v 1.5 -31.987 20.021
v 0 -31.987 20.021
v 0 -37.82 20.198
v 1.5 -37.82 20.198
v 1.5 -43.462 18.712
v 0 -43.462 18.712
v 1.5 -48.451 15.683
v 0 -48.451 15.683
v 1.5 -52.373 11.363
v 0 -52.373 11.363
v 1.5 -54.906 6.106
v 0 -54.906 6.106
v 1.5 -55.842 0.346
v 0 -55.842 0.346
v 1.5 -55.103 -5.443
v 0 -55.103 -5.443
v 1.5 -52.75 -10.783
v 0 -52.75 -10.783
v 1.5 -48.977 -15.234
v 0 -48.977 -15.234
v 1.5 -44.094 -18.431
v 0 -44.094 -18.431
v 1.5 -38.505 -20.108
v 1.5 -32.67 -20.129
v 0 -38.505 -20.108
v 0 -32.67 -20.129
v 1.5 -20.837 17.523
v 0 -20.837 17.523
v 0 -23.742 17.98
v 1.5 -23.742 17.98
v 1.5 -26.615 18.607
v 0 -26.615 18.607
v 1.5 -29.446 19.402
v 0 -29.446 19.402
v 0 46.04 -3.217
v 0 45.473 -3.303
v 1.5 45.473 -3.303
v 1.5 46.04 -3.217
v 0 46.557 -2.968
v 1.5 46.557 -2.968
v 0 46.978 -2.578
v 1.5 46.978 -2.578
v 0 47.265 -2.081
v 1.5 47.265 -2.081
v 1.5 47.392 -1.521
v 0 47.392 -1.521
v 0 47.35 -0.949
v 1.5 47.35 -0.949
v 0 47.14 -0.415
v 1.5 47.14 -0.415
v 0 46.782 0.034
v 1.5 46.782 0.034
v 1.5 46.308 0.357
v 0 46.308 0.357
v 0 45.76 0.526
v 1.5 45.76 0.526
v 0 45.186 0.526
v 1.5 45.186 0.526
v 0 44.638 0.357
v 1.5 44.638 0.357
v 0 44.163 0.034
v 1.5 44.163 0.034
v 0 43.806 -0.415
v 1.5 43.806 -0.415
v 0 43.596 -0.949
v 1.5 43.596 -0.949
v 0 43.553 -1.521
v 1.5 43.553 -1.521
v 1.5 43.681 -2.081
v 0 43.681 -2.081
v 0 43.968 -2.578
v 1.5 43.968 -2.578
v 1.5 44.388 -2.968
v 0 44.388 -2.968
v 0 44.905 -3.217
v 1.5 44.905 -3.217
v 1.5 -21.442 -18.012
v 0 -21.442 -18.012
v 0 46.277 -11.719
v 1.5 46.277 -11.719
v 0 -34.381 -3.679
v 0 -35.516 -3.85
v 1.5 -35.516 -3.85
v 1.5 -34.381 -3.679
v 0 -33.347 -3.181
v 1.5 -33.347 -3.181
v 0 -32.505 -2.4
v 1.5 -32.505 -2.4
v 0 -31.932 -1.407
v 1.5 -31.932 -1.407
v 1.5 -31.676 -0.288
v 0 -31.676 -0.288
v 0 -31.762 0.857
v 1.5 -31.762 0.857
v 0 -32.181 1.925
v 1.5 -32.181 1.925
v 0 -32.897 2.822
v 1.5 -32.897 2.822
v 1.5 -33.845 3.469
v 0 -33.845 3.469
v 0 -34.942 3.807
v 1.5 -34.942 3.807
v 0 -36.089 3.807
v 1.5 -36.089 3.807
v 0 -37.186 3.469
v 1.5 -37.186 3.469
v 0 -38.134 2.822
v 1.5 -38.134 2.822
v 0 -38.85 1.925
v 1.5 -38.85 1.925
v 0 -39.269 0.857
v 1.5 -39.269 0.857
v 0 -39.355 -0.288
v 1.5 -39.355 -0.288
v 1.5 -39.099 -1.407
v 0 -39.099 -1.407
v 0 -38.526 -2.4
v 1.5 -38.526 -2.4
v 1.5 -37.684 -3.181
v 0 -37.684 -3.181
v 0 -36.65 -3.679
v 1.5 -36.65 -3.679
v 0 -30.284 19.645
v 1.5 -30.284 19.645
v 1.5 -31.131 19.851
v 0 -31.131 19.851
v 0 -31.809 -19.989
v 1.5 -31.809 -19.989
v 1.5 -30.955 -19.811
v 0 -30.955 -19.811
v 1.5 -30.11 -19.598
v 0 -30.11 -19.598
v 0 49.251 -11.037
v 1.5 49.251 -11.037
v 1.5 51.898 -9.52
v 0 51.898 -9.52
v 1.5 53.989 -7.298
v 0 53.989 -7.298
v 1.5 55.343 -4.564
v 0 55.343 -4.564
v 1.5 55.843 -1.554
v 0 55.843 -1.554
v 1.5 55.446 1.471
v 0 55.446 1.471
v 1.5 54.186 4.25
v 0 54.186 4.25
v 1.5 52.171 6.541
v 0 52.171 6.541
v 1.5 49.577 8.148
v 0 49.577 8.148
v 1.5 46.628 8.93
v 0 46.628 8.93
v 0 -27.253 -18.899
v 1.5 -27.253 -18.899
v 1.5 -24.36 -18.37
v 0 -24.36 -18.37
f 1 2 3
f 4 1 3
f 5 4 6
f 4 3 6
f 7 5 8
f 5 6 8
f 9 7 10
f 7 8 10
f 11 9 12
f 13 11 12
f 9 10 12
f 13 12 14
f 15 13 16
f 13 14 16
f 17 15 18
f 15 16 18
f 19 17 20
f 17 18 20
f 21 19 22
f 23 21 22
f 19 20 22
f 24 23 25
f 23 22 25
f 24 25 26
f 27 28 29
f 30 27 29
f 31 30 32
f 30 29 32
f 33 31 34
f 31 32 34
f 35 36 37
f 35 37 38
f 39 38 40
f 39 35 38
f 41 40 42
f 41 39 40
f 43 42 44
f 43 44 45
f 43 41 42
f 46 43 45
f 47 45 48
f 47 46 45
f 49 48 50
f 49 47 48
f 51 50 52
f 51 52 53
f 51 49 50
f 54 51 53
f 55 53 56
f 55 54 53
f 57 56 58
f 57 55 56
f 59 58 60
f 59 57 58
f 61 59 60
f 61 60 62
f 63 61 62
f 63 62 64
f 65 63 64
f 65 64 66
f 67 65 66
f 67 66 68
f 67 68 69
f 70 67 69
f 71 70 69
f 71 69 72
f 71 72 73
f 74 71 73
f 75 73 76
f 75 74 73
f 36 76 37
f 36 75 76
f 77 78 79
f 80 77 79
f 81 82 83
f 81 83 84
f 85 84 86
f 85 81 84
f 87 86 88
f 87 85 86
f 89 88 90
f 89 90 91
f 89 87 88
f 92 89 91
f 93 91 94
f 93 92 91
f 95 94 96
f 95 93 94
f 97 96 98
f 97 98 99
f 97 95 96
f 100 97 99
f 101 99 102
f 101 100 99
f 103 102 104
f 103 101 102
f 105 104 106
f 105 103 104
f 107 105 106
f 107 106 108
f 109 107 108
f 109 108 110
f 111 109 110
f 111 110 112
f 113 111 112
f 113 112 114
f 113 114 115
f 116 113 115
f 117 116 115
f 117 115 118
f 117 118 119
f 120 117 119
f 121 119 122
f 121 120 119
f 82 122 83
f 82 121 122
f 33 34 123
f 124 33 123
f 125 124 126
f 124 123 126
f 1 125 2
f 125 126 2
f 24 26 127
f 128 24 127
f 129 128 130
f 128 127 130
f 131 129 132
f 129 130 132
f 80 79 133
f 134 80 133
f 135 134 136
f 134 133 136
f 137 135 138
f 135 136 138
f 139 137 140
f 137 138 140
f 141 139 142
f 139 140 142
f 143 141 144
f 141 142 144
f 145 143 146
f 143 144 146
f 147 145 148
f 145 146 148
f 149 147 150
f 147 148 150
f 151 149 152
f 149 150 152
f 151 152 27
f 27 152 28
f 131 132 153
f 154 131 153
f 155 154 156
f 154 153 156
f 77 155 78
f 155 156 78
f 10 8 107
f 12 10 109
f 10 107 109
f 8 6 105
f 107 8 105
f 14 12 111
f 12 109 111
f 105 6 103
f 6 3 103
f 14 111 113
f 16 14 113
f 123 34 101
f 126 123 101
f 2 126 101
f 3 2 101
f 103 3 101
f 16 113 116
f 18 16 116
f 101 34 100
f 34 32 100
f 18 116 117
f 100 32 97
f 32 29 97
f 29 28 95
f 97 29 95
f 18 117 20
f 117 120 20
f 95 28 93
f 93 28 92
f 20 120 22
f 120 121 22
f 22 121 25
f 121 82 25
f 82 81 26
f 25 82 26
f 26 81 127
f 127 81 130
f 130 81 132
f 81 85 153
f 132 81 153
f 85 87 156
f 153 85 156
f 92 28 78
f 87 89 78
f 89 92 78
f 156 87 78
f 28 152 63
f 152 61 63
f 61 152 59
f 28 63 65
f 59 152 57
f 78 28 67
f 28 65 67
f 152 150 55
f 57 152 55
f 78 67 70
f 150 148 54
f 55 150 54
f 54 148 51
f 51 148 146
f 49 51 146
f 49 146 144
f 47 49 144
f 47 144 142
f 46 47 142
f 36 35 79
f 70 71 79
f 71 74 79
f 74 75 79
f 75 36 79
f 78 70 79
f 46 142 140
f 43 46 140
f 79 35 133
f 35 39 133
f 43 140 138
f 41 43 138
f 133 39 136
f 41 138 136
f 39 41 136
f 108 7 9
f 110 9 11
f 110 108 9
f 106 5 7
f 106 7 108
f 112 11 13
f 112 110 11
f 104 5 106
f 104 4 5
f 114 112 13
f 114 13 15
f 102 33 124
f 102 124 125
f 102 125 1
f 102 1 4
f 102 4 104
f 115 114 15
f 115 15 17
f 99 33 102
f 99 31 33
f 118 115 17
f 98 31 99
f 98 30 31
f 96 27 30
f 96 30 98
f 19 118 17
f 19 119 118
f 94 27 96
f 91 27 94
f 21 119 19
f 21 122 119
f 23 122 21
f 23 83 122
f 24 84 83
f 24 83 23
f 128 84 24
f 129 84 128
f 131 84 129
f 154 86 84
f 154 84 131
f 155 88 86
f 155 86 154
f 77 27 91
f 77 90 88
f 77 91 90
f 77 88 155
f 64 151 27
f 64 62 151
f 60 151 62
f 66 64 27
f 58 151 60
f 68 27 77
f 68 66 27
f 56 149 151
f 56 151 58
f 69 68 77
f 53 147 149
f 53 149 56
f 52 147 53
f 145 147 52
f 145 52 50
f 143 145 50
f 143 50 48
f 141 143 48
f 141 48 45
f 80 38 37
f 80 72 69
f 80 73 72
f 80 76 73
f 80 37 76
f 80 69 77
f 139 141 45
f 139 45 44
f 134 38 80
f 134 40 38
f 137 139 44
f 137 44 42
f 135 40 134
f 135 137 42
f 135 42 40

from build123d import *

# Parameters (mm, degrees)
SKETCH_2_R      = 3.85
SKETCH_2_R_2    = 1.925
EXTRUDE_1_DEPTH = 1.5


with BuildPart() as part:
    # 草圖2 → 填料-伸長1 (new body)
    with BuildSketch(Plane(origin=(0, 0, 0), x_dir=(0, 0, -1), z_dir=(1, 0, 0))):
        with BuildLine():
            Line((18.012072511, -21.441606673), (11.718522882, 46.276737912))
            ThreePointArc((11.718522882, 46.276737912), (1.55399875, 55.843411078), (-8.930005845, 46.627965677))
            Line((-8.930005845, 46.627965677), (-17.523002046, -20.837161438))
            ThreePointArc((-17.523002046, -20.837161438), (-18.27264724, -25.183298229), (-19.402359762, -29.446468708))
            ThreePointArc((-19.402359762, -29.446468708), (-19.752456192, -30.70663404), (-20.020797275, -31.986703271))
            ThreePointArc((-20.020797275, -31.986703271), (-0.345749536, -55.841970902), (20.12922907, -32.669648007))
            ThreePointArc((20.12922907, -32.669648007), (19.904578122, -31.38119307), (19.597542195, -30.109850035))
            ThreePointArc((19.597542195, -30.109850035), (18.61347279, -25.810724505), (18.012072511, -21.441606673))
        make_face()
        with Locations((0, -35.515504866)):
            Circle(SKETCH_2_R, mode=Mode.SUBTRACT)
        with Locations((1.377596172, 45.472779649)):
            Circle(SKETCH_2_R_2, mode=Mode.SUBTRACT)
    extrude(amount=EXTRUDE_1_DEPTH)


solid = part.part
